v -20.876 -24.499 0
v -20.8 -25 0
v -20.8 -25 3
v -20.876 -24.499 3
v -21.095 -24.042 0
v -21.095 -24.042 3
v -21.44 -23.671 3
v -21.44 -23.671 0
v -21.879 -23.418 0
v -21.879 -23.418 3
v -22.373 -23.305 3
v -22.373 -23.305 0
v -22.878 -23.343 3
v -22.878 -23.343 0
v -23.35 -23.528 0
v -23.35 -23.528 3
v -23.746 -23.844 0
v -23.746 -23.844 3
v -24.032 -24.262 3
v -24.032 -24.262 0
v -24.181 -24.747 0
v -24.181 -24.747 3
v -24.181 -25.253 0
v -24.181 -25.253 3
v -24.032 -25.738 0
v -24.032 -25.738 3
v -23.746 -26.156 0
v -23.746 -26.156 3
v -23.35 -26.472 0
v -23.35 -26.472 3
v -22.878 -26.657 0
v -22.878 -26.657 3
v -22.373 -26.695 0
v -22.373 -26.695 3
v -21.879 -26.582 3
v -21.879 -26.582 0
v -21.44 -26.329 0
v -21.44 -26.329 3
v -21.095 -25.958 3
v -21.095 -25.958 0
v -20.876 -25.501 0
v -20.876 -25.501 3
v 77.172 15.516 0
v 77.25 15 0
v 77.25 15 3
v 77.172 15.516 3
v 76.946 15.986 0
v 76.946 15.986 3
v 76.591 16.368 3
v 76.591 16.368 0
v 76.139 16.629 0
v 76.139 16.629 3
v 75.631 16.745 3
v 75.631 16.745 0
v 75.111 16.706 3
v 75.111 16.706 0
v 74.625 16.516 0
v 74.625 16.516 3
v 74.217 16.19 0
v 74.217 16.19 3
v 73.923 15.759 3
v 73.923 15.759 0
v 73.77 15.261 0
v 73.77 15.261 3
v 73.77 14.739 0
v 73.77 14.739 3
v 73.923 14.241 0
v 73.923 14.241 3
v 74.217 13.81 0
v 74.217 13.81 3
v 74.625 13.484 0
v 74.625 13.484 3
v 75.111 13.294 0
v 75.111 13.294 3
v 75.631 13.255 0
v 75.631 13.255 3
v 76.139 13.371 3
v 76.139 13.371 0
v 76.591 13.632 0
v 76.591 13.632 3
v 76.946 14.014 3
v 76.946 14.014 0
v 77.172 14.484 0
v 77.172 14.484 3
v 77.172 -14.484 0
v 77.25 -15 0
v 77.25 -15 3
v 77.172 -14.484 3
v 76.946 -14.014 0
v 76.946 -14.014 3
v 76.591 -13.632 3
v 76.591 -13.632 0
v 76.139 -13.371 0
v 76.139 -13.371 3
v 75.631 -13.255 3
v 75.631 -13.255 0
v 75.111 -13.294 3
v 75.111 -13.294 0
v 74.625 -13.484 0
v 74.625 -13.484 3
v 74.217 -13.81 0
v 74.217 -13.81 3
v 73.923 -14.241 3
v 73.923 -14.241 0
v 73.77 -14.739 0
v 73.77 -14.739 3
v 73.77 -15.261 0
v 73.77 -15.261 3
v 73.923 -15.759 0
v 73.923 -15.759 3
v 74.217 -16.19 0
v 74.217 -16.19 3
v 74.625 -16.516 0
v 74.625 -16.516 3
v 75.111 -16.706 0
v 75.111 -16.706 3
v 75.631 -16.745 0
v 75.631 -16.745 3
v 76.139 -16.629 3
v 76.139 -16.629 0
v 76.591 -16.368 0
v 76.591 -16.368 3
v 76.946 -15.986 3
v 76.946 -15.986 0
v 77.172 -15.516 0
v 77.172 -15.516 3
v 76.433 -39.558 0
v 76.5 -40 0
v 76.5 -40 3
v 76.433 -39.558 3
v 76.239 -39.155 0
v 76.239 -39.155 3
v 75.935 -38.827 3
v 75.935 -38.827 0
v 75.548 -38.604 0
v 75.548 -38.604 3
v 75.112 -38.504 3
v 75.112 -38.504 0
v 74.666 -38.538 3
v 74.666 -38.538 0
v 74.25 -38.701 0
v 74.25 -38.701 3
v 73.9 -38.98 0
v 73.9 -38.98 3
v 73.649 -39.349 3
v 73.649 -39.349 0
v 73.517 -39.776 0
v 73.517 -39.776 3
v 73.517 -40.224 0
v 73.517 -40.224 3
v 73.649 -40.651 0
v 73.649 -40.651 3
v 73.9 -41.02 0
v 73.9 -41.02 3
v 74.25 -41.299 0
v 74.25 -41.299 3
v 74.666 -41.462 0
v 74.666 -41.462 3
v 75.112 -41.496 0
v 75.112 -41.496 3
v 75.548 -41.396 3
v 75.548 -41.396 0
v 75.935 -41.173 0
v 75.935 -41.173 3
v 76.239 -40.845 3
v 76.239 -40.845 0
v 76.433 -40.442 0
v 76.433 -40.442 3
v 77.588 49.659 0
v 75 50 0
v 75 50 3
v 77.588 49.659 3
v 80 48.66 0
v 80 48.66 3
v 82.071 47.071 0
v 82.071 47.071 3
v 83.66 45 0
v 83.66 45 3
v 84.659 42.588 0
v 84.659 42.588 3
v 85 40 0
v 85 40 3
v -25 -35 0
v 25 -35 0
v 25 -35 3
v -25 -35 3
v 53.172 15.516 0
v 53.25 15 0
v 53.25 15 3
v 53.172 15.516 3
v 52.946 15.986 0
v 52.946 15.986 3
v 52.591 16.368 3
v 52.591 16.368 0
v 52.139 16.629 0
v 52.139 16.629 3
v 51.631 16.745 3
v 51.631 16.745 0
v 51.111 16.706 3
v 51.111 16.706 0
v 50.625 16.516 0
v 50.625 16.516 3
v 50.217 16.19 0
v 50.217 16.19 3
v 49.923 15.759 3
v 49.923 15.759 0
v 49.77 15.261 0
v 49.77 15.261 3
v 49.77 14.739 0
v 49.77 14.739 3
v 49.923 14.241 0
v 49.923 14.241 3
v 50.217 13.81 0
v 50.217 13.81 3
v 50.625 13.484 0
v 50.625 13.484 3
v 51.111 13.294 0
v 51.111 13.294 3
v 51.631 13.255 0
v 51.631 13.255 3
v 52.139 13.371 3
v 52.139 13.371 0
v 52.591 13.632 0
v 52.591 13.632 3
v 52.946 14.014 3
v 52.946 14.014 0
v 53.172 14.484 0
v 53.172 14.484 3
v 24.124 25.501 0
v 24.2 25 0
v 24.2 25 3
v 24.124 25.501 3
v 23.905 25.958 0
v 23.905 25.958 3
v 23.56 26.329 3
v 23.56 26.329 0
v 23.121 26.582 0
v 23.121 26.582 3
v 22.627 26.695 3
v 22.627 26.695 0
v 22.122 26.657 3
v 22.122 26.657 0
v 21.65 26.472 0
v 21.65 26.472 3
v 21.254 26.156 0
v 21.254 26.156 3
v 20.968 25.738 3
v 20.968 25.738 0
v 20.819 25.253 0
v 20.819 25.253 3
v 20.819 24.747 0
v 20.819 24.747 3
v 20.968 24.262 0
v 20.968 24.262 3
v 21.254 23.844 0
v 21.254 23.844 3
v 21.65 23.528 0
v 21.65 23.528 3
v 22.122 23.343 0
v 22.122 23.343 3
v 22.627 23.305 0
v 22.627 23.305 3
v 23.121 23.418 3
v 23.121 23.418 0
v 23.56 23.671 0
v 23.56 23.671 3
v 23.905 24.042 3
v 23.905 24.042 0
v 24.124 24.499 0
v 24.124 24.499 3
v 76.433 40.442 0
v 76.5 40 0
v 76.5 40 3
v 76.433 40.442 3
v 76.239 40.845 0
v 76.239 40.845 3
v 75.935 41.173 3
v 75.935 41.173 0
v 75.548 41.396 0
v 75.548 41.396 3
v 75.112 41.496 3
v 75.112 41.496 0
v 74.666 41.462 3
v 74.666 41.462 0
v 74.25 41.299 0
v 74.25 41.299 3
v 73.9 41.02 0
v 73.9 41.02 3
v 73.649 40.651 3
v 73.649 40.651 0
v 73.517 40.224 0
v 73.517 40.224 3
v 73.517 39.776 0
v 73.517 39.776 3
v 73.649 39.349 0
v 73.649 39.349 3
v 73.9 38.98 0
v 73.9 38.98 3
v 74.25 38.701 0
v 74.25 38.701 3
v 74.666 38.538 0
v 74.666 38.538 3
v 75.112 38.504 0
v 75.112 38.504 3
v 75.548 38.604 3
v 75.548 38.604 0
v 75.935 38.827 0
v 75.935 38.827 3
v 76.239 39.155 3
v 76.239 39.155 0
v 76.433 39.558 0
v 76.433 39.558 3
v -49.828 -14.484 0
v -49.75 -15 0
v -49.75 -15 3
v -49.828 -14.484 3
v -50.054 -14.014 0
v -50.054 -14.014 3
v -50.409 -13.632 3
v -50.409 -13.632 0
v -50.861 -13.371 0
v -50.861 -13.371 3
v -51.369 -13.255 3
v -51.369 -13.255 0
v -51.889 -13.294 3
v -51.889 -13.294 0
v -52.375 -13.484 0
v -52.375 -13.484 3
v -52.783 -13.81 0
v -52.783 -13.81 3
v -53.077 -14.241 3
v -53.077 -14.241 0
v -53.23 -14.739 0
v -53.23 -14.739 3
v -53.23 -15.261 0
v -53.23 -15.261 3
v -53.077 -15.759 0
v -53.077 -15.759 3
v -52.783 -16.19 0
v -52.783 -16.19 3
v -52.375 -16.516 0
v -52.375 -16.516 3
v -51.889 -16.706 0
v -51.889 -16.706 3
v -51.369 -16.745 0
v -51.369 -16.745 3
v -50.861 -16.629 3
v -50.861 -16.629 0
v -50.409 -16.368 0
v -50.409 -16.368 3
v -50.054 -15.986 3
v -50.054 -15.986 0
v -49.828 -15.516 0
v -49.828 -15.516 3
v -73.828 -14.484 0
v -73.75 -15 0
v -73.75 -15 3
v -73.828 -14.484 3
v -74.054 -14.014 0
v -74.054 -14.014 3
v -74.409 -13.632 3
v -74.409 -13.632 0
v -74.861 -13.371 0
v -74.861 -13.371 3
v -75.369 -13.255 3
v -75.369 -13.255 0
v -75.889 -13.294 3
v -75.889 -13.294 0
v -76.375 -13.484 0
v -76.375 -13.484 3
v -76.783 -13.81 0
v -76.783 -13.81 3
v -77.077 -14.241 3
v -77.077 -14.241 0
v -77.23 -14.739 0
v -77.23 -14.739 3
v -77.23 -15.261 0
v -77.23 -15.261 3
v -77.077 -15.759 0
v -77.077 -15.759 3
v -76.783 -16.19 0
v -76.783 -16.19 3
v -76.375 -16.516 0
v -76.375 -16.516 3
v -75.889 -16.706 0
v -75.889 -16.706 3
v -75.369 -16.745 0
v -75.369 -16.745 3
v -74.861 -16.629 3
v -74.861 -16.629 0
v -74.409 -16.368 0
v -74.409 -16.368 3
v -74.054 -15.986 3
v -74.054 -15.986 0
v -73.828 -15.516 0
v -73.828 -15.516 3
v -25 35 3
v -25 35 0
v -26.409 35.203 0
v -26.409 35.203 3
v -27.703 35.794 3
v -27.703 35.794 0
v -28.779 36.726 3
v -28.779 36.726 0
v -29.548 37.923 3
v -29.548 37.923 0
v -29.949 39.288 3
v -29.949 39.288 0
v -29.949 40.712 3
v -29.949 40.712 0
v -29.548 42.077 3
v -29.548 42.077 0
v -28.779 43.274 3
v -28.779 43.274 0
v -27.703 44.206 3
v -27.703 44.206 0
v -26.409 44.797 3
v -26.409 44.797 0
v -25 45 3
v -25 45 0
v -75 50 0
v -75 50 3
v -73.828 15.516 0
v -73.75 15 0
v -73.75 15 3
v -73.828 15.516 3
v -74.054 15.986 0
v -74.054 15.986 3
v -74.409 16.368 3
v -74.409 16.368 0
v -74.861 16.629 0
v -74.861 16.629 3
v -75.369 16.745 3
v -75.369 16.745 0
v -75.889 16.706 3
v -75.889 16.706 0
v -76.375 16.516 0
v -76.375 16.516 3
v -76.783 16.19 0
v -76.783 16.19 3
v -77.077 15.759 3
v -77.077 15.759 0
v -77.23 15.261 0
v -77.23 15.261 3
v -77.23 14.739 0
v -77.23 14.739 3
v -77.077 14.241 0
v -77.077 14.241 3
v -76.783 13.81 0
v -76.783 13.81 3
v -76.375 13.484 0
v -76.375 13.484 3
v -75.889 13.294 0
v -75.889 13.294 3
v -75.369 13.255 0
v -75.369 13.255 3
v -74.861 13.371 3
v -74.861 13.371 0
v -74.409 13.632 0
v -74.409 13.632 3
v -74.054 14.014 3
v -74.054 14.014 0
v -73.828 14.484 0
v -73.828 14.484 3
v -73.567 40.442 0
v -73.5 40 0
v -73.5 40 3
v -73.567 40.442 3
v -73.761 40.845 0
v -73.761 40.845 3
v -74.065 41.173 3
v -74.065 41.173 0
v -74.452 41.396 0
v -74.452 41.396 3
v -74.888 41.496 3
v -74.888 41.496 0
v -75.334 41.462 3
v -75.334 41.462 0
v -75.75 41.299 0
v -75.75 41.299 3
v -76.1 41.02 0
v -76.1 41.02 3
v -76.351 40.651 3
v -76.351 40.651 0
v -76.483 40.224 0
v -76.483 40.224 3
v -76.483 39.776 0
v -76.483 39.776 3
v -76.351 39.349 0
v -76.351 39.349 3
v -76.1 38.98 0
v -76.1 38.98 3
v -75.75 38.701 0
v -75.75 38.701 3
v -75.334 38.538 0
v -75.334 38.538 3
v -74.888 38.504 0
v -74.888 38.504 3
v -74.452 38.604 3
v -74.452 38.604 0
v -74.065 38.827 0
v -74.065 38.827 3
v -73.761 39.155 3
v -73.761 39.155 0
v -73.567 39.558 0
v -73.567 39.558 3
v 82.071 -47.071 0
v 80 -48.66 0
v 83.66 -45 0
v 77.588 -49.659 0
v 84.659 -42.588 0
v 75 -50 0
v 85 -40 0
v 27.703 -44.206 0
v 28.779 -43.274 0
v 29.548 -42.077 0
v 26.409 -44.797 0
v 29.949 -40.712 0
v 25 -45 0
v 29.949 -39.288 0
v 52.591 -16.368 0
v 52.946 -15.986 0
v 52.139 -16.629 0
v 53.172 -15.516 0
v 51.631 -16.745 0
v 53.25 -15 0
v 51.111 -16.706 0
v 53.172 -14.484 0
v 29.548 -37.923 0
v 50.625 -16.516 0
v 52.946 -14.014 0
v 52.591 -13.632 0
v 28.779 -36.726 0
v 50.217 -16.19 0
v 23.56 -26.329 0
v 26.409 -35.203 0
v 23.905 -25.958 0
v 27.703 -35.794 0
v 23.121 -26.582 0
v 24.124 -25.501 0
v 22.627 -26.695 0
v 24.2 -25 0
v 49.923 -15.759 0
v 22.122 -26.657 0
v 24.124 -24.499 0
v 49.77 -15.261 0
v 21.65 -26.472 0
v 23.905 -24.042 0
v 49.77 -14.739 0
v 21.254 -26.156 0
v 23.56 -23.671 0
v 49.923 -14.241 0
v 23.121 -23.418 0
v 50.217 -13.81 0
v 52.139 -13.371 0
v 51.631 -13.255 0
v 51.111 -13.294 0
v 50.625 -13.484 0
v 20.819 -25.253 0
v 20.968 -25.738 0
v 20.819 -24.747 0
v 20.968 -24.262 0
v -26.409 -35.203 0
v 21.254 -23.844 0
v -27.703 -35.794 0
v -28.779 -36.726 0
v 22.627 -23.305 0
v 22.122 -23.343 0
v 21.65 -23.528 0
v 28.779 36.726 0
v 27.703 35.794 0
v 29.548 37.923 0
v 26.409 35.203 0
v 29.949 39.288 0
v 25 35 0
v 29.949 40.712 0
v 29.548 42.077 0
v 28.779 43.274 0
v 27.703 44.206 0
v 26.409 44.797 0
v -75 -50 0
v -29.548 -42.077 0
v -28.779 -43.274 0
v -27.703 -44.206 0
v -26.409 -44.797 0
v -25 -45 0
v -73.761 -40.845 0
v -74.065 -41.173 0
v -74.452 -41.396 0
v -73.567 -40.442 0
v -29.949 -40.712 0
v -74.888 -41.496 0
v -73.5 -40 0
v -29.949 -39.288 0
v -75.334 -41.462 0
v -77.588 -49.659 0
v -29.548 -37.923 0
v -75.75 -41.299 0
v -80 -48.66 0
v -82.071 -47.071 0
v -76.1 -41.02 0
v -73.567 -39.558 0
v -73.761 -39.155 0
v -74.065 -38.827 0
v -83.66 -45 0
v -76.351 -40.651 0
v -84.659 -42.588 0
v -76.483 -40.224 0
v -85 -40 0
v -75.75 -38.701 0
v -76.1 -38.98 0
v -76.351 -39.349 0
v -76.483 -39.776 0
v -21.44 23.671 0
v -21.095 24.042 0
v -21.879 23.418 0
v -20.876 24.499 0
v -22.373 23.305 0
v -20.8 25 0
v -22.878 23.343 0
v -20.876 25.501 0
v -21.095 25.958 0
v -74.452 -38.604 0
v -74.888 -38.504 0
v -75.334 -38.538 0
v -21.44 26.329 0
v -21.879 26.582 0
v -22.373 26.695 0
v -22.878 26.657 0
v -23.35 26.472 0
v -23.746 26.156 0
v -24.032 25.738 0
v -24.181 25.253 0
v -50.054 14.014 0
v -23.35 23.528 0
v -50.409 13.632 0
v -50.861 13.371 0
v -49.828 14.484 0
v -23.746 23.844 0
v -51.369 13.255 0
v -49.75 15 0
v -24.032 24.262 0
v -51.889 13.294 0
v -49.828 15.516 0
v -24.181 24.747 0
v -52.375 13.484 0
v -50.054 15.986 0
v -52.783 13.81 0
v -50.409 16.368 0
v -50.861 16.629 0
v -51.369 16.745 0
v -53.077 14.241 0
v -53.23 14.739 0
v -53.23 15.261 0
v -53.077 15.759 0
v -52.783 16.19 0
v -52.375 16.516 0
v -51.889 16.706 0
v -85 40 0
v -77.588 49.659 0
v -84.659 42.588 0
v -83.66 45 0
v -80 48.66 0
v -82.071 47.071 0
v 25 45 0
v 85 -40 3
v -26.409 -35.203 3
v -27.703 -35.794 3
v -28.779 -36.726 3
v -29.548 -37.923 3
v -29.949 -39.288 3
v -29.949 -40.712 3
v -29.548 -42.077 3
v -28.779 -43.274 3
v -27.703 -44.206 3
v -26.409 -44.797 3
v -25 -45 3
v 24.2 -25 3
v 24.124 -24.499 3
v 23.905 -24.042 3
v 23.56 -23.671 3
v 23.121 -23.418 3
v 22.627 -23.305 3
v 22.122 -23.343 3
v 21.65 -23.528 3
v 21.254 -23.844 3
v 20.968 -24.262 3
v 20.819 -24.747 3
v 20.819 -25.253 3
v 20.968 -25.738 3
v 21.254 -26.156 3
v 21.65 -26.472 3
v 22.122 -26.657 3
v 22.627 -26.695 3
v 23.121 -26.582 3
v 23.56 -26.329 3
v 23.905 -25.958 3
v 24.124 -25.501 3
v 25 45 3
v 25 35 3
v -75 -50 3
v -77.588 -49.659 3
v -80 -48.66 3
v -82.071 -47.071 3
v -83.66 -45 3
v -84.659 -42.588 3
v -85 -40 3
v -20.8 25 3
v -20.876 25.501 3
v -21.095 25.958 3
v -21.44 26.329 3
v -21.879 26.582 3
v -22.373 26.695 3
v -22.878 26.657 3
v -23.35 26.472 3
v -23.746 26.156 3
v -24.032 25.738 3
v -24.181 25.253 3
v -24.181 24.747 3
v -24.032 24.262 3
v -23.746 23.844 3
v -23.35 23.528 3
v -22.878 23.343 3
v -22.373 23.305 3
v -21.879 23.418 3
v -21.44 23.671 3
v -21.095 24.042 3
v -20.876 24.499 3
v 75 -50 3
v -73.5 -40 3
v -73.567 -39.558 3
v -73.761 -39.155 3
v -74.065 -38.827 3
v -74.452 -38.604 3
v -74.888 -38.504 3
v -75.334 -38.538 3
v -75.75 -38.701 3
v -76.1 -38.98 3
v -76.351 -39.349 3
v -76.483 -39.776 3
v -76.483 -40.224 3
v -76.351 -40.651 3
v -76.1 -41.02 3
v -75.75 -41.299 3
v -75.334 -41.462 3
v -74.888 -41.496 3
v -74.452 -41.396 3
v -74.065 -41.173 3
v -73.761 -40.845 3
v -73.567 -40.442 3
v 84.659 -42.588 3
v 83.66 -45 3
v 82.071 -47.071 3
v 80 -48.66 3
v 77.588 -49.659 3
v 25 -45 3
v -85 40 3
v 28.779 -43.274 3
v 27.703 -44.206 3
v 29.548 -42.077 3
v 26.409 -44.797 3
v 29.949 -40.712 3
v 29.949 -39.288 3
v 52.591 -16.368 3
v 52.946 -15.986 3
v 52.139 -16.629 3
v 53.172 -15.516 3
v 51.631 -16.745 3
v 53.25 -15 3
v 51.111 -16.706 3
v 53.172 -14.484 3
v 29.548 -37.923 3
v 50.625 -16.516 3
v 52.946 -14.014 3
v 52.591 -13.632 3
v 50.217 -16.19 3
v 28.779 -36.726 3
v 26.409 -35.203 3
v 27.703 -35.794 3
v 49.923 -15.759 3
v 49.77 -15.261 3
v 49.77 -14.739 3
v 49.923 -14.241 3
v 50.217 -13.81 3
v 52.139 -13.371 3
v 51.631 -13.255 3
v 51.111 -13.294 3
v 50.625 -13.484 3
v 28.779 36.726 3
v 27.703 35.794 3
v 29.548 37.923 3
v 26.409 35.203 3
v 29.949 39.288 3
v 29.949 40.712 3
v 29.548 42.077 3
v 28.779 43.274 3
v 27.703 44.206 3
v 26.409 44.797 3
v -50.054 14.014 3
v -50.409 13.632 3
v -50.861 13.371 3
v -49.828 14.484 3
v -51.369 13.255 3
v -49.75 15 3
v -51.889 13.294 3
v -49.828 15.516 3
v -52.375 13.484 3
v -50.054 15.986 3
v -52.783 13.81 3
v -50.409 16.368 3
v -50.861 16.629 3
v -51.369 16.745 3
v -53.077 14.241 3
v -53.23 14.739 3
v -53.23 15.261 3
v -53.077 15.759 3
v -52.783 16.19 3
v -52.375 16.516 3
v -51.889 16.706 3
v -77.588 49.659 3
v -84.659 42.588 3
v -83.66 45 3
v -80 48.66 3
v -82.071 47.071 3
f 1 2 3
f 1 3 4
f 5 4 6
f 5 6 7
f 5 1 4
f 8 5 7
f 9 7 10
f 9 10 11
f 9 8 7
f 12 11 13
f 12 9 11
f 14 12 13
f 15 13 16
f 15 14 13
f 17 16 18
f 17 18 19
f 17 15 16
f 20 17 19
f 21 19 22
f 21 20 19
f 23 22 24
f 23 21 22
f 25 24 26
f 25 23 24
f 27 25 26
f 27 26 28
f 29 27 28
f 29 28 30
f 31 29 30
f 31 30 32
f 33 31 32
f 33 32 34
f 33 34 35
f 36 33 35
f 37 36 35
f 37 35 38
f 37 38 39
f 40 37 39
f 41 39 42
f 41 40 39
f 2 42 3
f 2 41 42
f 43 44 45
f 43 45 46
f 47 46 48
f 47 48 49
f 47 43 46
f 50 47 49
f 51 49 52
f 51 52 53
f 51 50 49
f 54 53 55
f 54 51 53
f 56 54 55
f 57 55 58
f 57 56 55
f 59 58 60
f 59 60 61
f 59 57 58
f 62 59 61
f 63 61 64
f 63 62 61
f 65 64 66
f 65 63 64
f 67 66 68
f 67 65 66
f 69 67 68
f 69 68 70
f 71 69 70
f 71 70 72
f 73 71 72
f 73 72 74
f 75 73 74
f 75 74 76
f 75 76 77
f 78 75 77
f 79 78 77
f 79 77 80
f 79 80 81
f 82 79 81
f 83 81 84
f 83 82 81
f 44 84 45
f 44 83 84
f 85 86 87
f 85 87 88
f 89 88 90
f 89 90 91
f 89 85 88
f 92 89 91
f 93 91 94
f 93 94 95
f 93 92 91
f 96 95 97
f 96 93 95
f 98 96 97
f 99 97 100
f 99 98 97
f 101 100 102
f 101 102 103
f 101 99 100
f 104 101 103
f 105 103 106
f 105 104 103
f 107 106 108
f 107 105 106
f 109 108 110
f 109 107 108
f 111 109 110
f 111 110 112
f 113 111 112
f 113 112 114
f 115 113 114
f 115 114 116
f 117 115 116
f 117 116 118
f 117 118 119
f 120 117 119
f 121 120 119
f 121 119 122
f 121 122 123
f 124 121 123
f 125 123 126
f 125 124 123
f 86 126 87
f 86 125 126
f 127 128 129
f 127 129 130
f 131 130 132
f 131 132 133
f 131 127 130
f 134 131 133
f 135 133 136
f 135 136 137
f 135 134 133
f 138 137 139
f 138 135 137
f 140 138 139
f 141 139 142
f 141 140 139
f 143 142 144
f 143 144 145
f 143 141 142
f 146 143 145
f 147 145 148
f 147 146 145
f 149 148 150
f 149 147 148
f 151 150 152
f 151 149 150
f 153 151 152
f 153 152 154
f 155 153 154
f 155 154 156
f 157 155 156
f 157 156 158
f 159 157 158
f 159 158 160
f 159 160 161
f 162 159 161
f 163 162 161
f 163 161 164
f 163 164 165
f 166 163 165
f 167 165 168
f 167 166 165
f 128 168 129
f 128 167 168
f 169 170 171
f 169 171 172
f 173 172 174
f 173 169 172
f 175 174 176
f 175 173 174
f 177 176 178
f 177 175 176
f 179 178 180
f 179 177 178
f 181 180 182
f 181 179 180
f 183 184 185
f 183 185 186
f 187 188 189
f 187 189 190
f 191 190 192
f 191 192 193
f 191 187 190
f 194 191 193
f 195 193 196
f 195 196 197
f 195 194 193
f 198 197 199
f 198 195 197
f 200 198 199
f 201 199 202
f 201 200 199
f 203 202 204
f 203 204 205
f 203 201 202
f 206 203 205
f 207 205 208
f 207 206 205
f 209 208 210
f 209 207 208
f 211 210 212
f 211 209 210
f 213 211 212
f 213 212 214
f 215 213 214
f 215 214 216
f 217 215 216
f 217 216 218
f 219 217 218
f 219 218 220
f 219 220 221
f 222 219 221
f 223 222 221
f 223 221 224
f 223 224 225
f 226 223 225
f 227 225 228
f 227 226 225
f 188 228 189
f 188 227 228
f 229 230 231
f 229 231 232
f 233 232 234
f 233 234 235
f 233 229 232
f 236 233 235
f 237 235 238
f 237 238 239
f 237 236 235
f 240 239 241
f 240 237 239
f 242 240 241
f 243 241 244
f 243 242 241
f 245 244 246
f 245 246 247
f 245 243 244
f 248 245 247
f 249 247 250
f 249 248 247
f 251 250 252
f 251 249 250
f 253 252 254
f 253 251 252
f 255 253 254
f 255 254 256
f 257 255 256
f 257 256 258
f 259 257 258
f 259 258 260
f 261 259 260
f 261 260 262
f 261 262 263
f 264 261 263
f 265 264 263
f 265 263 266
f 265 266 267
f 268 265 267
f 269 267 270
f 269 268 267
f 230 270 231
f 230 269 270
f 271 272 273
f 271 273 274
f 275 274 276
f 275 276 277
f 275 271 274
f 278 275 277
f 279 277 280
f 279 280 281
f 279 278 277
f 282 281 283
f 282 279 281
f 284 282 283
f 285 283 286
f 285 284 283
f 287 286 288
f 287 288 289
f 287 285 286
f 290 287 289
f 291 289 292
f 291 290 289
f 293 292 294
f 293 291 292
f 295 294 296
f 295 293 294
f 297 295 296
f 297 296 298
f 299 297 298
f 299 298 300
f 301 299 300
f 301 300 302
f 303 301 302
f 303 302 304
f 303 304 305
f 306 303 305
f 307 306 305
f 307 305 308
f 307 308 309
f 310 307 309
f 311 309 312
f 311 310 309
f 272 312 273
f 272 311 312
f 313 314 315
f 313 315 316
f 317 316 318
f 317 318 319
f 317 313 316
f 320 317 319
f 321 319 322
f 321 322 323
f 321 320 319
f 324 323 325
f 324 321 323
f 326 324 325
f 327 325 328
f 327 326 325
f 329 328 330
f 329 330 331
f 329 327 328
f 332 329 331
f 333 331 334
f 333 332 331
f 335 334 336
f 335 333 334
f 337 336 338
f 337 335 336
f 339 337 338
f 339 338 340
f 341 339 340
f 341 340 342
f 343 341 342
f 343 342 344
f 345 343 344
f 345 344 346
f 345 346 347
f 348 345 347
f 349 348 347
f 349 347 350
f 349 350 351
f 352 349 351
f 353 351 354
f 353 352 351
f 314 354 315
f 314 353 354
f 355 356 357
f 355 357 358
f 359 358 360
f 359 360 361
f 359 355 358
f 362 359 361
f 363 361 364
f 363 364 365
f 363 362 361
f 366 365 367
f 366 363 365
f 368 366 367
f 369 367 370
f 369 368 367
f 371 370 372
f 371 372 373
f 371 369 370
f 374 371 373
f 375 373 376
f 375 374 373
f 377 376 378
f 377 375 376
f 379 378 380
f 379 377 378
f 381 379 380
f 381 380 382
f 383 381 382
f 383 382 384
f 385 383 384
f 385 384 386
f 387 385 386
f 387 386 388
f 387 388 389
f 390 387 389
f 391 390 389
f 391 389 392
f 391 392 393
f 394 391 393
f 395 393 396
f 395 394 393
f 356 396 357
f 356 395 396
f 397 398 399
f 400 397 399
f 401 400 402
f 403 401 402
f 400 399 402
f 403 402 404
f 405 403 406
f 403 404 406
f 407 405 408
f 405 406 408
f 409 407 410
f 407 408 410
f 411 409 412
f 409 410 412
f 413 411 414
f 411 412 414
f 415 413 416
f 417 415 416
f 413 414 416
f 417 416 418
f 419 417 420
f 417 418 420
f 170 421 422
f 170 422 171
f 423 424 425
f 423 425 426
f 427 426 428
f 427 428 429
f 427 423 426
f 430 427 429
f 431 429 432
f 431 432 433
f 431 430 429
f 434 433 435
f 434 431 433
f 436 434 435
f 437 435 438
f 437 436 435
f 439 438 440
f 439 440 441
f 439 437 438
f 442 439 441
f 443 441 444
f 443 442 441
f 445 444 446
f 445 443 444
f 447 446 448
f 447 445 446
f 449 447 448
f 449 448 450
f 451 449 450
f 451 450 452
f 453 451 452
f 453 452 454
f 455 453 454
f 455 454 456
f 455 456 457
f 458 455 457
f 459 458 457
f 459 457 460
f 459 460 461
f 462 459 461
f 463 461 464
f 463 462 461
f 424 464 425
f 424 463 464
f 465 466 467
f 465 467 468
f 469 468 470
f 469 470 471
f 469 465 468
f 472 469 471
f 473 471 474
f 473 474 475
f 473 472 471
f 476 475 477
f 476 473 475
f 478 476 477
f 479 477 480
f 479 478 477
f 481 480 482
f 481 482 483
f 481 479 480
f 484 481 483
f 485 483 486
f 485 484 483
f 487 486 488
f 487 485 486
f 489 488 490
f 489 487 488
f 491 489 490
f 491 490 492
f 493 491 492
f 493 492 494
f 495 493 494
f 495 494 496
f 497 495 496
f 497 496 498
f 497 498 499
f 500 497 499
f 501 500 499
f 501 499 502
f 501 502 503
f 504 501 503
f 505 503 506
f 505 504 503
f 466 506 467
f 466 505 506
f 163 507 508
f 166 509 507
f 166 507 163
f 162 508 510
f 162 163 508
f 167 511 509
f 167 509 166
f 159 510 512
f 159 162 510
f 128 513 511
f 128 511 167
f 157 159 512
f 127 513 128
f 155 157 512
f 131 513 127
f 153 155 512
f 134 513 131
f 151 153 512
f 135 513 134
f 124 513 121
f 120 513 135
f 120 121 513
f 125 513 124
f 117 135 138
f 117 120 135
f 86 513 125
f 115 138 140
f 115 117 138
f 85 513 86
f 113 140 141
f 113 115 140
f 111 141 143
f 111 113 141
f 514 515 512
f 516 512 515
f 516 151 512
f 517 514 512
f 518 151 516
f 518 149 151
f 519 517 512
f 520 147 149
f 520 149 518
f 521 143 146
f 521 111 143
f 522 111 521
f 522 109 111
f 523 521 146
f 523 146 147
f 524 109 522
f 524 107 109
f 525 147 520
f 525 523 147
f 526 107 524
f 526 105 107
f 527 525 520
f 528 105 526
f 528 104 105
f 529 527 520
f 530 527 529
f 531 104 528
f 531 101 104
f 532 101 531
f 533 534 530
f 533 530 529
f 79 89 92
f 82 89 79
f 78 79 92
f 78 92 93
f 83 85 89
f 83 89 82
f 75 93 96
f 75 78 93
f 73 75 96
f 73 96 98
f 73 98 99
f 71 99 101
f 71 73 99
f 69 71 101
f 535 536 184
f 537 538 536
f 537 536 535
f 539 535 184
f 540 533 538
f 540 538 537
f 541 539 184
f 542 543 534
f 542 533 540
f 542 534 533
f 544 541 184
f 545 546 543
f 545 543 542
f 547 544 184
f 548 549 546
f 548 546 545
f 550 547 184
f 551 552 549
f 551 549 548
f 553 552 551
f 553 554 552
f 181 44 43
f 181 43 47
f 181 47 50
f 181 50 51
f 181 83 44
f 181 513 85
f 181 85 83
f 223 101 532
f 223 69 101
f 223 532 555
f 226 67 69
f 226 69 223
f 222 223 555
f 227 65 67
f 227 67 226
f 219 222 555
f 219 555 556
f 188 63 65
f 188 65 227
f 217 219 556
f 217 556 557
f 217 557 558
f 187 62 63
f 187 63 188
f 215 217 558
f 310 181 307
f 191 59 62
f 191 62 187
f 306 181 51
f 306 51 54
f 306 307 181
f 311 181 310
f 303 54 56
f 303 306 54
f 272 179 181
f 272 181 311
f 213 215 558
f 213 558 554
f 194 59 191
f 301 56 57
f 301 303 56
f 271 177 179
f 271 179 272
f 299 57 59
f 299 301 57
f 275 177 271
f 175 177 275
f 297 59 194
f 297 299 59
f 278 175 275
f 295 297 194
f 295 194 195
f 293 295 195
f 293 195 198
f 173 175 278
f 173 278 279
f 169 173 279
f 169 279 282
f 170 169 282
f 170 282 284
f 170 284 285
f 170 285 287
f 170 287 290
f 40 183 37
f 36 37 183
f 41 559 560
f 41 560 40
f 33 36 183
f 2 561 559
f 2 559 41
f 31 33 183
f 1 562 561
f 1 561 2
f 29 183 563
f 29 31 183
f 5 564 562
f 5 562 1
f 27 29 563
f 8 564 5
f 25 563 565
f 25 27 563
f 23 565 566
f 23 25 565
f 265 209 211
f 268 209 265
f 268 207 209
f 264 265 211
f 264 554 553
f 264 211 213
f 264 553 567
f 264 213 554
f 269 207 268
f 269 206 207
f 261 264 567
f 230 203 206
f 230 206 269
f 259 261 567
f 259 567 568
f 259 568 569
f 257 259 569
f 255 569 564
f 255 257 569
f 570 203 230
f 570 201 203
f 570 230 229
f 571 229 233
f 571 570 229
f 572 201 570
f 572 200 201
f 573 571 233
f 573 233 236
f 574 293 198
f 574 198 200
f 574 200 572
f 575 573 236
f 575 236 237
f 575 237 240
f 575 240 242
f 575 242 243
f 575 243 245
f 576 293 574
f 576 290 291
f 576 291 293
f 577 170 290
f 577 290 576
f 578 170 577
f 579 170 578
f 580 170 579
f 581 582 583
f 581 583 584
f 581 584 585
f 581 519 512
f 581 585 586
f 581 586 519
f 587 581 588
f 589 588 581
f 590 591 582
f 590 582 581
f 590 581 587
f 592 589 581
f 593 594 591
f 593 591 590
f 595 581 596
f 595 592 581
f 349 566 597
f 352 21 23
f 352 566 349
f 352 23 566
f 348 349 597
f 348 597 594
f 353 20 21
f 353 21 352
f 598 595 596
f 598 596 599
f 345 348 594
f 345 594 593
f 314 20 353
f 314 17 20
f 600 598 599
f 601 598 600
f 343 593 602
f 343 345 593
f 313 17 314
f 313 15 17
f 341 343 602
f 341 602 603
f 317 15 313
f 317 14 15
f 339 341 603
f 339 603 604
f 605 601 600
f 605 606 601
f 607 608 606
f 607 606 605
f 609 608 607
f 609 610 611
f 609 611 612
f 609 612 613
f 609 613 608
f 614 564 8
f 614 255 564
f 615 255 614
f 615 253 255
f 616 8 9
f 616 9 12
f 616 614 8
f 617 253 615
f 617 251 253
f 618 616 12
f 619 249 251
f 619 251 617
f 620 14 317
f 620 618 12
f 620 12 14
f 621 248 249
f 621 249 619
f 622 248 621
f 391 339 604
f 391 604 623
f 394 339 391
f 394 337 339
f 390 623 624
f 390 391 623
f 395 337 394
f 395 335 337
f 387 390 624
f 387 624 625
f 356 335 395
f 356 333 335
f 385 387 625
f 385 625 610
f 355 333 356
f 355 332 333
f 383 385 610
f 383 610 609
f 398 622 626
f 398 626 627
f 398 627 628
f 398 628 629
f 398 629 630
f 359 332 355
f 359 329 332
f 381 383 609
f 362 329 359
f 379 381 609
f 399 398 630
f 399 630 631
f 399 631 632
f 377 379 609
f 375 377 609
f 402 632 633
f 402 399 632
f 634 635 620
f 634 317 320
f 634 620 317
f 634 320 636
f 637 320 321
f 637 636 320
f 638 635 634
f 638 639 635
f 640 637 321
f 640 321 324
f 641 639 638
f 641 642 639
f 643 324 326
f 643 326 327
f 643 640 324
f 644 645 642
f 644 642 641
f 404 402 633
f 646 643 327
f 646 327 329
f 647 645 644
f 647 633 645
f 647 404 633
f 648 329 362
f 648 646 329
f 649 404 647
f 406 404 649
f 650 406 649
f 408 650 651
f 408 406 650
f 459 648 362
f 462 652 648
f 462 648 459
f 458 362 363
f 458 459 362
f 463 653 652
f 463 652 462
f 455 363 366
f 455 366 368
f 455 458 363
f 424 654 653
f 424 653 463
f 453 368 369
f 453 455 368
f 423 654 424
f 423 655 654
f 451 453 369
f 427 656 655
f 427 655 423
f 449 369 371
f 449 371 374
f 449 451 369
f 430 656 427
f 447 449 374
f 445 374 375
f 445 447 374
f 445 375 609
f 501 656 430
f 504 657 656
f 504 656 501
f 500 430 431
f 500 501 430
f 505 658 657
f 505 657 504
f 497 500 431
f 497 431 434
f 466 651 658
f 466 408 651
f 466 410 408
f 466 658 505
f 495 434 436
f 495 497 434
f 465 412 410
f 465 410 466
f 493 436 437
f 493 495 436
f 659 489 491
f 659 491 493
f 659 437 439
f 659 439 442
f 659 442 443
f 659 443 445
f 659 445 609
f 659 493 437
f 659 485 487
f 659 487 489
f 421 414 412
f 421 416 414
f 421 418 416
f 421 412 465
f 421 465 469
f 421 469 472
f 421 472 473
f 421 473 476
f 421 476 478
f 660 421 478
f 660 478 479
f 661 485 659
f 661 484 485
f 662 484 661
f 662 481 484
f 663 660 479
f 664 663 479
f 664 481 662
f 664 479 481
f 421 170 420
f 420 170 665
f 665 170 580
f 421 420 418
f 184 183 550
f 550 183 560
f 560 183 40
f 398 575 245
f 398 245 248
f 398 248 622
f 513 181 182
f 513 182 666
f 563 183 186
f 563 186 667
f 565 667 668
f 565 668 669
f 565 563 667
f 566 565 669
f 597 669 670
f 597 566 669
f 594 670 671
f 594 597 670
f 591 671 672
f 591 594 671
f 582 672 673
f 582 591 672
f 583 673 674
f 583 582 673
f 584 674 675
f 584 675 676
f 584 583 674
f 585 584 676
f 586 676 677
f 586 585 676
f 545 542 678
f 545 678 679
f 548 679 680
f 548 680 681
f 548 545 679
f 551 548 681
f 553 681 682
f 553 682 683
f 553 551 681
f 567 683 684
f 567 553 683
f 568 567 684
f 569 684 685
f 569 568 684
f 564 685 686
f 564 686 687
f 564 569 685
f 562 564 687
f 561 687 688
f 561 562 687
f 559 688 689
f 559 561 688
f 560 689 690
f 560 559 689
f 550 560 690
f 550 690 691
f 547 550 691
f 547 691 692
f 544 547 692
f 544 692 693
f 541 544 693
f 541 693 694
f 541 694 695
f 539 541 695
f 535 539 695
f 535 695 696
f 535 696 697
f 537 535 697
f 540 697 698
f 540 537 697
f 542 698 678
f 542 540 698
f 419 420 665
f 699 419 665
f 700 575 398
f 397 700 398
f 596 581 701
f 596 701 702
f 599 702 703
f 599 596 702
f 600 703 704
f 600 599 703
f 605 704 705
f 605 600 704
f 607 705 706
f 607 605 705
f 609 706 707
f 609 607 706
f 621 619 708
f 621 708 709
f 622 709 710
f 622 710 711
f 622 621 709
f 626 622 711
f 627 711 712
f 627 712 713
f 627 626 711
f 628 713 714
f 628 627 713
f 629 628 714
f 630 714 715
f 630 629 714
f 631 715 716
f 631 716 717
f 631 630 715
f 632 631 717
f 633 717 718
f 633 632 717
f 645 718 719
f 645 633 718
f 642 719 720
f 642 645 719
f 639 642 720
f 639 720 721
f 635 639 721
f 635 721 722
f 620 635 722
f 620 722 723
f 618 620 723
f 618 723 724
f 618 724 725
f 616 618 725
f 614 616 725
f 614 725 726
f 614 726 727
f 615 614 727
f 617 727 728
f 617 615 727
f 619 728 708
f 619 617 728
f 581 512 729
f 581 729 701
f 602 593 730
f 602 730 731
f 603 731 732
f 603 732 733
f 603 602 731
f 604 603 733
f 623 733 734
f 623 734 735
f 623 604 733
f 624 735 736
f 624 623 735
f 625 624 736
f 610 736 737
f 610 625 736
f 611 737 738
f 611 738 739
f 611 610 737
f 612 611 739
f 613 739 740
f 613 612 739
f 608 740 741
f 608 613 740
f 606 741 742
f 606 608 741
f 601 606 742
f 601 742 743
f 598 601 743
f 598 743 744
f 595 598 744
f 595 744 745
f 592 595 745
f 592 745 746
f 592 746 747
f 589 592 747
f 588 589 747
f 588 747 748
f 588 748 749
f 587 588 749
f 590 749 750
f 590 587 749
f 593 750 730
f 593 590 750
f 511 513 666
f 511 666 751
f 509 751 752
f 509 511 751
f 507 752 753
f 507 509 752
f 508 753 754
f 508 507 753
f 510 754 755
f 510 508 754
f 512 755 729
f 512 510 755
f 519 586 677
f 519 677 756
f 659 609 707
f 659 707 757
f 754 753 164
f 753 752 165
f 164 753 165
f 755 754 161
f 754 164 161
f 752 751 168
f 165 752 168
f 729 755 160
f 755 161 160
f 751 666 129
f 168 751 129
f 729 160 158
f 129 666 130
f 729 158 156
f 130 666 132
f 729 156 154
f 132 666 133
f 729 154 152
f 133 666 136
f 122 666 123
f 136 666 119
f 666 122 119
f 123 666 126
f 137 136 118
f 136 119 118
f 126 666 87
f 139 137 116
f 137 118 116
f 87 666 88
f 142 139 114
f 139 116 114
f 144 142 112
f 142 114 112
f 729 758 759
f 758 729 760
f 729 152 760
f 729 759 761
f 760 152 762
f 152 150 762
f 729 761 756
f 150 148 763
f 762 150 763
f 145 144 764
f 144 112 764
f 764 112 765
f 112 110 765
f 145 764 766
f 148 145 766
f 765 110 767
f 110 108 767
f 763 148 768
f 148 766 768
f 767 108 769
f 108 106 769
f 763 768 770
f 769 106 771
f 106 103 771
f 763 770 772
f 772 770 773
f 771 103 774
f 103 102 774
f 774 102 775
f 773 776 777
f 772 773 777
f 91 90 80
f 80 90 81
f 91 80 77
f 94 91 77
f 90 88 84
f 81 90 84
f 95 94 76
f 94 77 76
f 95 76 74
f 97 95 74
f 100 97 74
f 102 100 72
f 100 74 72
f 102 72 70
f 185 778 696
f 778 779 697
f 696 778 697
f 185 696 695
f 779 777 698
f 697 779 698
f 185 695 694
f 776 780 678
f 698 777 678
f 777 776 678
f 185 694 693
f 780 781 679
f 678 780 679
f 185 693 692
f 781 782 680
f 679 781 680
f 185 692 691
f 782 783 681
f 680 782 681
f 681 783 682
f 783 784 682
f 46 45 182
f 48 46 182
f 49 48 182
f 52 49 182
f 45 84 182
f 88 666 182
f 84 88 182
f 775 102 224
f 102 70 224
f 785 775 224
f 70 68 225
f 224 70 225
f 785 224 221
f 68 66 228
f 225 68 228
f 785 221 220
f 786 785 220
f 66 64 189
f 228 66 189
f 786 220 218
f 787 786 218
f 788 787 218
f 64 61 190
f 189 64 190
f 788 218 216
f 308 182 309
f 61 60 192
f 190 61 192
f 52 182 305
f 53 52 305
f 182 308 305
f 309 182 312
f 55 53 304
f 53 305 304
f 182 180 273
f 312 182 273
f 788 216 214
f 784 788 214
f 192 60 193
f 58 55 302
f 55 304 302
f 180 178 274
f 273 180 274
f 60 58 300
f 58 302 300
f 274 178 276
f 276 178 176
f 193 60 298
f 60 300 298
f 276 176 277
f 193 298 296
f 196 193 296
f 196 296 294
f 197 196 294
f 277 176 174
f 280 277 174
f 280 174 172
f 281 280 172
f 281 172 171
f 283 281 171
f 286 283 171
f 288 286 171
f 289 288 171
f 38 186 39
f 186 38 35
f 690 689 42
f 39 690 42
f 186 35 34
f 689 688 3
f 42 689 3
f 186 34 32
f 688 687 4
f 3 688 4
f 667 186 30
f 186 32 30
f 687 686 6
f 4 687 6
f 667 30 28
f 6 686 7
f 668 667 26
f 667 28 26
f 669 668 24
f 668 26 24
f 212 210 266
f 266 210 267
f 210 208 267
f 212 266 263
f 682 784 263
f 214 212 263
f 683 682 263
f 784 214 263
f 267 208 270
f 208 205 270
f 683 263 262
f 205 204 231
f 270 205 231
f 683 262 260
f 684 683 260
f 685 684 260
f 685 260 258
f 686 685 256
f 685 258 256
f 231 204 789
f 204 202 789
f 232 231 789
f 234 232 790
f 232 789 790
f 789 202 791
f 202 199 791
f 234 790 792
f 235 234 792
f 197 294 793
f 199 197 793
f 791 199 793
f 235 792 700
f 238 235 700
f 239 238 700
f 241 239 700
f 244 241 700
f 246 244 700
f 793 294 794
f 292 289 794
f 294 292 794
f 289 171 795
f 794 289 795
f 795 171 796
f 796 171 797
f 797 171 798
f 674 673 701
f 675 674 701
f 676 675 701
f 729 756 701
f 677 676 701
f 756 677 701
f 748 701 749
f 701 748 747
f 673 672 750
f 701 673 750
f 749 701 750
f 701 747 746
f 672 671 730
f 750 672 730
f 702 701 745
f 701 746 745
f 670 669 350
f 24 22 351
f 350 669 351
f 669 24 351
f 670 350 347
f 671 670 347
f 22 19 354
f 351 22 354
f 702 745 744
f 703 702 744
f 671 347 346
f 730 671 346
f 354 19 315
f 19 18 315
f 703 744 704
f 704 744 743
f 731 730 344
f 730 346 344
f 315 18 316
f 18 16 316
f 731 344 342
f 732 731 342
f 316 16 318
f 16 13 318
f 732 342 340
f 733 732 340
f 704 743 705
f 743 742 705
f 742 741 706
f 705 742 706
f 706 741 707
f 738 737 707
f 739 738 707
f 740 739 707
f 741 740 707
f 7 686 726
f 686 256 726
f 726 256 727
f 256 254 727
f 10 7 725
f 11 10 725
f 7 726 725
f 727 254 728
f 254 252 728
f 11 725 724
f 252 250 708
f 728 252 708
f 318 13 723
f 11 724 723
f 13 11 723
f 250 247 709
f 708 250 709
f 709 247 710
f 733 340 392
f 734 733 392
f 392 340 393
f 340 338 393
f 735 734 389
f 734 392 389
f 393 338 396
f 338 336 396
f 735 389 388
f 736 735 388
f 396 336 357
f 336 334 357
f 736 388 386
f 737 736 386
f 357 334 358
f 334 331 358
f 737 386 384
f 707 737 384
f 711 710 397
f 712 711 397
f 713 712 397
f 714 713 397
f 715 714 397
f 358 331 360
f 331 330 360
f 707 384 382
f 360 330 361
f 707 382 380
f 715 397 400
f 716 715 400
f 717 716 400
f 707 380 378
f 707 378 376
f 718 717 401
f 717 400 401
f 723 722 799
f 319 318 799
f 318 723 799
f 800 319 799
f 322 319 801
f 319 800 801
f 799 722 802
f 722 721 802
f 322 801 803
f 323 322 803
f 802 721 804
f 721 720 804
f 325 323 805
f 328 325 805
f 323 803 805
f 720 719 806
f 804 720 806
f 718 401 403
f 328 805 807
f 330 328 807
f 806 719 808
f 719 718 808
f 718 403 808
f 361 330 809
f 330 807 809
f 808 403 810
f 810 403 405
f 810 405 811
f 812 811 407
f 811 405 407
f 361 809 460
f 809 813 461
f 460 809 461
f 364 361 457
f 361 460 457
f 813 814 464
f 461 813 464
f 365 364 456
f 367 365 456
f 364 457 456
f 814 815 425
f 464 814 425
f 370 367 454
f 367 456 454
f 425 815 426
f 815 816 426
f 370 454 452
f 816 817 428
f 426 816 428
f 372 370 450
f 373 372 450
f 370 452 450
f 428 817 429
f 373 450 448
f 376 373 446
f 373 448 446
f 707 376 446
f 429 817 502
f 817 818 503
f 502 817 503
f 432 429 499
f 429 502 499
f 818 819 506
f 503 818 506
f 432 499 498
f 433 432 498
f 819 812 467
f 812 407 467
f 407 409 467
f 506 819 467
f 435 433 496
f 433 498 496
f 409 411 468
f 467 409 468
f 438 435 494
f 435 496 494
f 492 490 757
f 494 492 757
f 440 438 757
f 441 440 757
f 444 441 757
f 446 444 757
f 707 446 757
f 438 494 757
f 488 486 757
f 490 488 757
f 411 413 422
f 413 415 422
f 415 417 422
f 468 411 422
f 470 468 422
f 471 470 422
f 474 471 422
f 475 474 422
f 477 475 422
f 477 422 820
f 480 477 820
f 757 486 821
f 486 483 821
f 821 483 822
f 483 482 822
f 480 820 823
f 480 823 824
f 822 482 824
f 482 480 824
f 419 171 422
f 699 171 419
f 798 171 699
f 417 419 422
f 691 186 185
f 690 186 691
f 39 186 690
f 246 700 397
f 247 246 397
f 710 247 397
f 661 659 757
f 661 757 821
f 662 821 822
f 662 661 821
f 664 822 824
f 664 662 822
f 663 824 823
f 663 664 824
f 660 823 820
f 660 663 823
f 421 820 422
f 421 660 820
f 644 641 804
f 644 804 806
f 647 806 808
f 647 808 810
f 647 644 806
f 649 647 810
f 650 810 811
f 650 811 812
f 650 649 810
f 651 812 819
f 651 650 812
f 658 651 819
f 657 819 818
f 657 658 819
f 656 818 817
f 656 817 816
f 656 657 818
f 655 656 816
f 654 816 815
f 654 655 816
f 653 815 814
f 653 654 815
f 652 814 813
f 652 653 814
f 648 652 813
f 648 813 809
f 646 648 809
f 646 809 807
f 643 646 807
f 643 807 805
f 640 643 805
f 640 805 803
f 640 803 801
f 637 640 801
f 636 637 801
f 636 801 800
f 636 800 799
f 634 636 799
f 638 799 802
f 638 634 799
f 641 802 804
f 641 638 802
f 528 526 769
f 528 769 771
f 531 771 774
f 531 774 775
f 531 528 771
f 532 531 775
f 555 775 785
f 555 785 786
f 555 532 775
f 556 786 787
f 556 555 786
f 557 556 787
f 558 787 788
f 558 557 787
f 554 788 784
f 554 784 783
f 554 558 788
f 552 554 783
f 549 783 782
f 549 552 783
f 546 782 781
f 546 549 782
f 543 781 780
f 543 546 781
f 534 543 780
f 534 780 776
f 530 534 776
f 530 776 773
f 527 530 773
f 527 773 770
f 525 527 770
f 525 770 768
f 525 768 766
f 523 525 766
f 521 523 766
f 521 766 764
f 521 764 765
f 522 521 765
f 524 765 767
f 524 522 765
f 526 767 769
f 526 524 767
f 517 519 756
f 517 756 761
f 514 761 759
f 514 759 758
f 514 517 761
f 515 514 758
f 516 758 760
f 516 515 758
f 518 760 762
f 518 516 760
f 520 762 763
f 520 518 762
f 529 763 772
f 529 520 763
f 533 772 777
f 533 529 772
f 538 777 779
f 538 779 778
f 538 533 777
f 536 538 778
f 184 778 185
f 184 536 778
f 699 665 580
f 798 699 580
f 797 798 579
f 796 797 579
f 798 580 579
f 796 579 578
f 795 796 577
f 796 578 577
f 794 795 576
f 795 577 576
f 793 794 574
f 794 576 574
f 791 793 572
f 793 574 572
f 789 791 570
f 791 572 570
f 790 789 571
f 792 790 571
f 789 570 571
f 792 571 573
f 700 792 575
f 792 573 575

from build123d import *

# Parameters (mm, degrees)
SKETCH1_R           = 1.75
SKETCH1_R_2         = 1.5
SKETCH1_R_3         = 1.7
BOSS_EXTRUDE1_DEPTH = 3


with BuildPart() as part:
    # Sketch1 → Boss-Extrude1 (new body)
    with BuildSketch(Plane.XY):
        with BuildLine():
            Line((-75, 50), (75, 50))
            ThreePointArc((75, 50), (82.071067812, 47.071067812), (85, 40))
            Line((85, 40), (85, -40))
            ThreePointArc((85, -40), (82.071067812, -47.071067812), (75, -50))
            Line((75, -50), (-75, -50))
            ThreePointArc((-75, -50), (-82.071067812, -47.071067812), (-85, -40))
            Line((-85, -40), (-85, 40))
            ThreePointArc((-85, 40), (-82.071067812, 47.071067812), (-75, 50))
        make_face()
        with Locations((-75.5, 15)):
            Circle(SKETCH1_R, mode=Mode.SUBTRACT)
        with Locations((-75.5, -15)):
            Circle(SKETCH1_R, mode=Mode.SUBTRACT)
        with Locations((-51.5, -15)):
            Circle(SKETCH1_R, mode=Mode.SUBTRACT)
        with Locations((-51.5, 15)):
            Circle(SKETCH1_R, mode=Mode.SUBTRACT)
        with Locations((75.5, -15)):
            Circle(SKETCH1_R, mode=Mode.SUBTRACT)
        with Locations((51.5, -15)):
            Circle(SKETCH1_R, mode=Mode.SUBTRACT)
        with Locations((51.5, 15)):
            Circle(SKETCH1_R, mode=Mode.SUBTRACT)
        with Locations((75.5, 15)):
            Circle(SKETCH1_R, mode=Mode.SUBTRACT)
        with Locations((-75, -40)):
            Circle(SKETCH1_R_2, mode=Mode.SUBTRACT)
        with Locations((-75, 40)):
            Circle(SKETCH1_R_2, mode=Mode.SUBTRACT)
        with Locations((75, 40)):
            Circle(SKETCH1_R_2, mode=Mode.SUBTRACT)
        with Locations((75, -40)):
            Circle(SKETCH1_R_2, mode=Mode.SUBTRACT)
        with Locations((-22.5, 25)):
            Circle(SKETCH1_R_3, mode=Mode.SUBTRACT)
        with Locations((22.5, 25)):
            Circle(SKETCH1_R_3, mode=Mode.SUBTRACT)
        with Locations((22.5, -25)):
            Circle(SKETCH1_R_3, mode=Mode.SUBTRACT)
        with Locations((-22.5, -25)):
            Circle(SKETCH1_R_3, mode=Mode.SUBTRACT)
        with BuildLine():
            Line((-25, 45), (25, 45))
            ThreePointArc((25, 45), (30, 40), (25, 35))
            Line((25, 35), (-25, 35))
            ThreePointArc((-25, 35), (-30, 40), (-25, 45))
        make_face(mode=Mode.SUBTRACT)
        with BuildLine():
            Line((-25, -45), (25, -45))
            ThreePointArc((25, -45), (30, -40), (25, -35))
            Line((25, -35), (-25, -35))
            ThreePointArc((-25, -35), (-30, -40), (-25, -45))
        make_face(mode=Mode.SUBTRACT)
    extrude(amount=BOSS_EXTRUDE1_DEPTH)


solid = part.part
